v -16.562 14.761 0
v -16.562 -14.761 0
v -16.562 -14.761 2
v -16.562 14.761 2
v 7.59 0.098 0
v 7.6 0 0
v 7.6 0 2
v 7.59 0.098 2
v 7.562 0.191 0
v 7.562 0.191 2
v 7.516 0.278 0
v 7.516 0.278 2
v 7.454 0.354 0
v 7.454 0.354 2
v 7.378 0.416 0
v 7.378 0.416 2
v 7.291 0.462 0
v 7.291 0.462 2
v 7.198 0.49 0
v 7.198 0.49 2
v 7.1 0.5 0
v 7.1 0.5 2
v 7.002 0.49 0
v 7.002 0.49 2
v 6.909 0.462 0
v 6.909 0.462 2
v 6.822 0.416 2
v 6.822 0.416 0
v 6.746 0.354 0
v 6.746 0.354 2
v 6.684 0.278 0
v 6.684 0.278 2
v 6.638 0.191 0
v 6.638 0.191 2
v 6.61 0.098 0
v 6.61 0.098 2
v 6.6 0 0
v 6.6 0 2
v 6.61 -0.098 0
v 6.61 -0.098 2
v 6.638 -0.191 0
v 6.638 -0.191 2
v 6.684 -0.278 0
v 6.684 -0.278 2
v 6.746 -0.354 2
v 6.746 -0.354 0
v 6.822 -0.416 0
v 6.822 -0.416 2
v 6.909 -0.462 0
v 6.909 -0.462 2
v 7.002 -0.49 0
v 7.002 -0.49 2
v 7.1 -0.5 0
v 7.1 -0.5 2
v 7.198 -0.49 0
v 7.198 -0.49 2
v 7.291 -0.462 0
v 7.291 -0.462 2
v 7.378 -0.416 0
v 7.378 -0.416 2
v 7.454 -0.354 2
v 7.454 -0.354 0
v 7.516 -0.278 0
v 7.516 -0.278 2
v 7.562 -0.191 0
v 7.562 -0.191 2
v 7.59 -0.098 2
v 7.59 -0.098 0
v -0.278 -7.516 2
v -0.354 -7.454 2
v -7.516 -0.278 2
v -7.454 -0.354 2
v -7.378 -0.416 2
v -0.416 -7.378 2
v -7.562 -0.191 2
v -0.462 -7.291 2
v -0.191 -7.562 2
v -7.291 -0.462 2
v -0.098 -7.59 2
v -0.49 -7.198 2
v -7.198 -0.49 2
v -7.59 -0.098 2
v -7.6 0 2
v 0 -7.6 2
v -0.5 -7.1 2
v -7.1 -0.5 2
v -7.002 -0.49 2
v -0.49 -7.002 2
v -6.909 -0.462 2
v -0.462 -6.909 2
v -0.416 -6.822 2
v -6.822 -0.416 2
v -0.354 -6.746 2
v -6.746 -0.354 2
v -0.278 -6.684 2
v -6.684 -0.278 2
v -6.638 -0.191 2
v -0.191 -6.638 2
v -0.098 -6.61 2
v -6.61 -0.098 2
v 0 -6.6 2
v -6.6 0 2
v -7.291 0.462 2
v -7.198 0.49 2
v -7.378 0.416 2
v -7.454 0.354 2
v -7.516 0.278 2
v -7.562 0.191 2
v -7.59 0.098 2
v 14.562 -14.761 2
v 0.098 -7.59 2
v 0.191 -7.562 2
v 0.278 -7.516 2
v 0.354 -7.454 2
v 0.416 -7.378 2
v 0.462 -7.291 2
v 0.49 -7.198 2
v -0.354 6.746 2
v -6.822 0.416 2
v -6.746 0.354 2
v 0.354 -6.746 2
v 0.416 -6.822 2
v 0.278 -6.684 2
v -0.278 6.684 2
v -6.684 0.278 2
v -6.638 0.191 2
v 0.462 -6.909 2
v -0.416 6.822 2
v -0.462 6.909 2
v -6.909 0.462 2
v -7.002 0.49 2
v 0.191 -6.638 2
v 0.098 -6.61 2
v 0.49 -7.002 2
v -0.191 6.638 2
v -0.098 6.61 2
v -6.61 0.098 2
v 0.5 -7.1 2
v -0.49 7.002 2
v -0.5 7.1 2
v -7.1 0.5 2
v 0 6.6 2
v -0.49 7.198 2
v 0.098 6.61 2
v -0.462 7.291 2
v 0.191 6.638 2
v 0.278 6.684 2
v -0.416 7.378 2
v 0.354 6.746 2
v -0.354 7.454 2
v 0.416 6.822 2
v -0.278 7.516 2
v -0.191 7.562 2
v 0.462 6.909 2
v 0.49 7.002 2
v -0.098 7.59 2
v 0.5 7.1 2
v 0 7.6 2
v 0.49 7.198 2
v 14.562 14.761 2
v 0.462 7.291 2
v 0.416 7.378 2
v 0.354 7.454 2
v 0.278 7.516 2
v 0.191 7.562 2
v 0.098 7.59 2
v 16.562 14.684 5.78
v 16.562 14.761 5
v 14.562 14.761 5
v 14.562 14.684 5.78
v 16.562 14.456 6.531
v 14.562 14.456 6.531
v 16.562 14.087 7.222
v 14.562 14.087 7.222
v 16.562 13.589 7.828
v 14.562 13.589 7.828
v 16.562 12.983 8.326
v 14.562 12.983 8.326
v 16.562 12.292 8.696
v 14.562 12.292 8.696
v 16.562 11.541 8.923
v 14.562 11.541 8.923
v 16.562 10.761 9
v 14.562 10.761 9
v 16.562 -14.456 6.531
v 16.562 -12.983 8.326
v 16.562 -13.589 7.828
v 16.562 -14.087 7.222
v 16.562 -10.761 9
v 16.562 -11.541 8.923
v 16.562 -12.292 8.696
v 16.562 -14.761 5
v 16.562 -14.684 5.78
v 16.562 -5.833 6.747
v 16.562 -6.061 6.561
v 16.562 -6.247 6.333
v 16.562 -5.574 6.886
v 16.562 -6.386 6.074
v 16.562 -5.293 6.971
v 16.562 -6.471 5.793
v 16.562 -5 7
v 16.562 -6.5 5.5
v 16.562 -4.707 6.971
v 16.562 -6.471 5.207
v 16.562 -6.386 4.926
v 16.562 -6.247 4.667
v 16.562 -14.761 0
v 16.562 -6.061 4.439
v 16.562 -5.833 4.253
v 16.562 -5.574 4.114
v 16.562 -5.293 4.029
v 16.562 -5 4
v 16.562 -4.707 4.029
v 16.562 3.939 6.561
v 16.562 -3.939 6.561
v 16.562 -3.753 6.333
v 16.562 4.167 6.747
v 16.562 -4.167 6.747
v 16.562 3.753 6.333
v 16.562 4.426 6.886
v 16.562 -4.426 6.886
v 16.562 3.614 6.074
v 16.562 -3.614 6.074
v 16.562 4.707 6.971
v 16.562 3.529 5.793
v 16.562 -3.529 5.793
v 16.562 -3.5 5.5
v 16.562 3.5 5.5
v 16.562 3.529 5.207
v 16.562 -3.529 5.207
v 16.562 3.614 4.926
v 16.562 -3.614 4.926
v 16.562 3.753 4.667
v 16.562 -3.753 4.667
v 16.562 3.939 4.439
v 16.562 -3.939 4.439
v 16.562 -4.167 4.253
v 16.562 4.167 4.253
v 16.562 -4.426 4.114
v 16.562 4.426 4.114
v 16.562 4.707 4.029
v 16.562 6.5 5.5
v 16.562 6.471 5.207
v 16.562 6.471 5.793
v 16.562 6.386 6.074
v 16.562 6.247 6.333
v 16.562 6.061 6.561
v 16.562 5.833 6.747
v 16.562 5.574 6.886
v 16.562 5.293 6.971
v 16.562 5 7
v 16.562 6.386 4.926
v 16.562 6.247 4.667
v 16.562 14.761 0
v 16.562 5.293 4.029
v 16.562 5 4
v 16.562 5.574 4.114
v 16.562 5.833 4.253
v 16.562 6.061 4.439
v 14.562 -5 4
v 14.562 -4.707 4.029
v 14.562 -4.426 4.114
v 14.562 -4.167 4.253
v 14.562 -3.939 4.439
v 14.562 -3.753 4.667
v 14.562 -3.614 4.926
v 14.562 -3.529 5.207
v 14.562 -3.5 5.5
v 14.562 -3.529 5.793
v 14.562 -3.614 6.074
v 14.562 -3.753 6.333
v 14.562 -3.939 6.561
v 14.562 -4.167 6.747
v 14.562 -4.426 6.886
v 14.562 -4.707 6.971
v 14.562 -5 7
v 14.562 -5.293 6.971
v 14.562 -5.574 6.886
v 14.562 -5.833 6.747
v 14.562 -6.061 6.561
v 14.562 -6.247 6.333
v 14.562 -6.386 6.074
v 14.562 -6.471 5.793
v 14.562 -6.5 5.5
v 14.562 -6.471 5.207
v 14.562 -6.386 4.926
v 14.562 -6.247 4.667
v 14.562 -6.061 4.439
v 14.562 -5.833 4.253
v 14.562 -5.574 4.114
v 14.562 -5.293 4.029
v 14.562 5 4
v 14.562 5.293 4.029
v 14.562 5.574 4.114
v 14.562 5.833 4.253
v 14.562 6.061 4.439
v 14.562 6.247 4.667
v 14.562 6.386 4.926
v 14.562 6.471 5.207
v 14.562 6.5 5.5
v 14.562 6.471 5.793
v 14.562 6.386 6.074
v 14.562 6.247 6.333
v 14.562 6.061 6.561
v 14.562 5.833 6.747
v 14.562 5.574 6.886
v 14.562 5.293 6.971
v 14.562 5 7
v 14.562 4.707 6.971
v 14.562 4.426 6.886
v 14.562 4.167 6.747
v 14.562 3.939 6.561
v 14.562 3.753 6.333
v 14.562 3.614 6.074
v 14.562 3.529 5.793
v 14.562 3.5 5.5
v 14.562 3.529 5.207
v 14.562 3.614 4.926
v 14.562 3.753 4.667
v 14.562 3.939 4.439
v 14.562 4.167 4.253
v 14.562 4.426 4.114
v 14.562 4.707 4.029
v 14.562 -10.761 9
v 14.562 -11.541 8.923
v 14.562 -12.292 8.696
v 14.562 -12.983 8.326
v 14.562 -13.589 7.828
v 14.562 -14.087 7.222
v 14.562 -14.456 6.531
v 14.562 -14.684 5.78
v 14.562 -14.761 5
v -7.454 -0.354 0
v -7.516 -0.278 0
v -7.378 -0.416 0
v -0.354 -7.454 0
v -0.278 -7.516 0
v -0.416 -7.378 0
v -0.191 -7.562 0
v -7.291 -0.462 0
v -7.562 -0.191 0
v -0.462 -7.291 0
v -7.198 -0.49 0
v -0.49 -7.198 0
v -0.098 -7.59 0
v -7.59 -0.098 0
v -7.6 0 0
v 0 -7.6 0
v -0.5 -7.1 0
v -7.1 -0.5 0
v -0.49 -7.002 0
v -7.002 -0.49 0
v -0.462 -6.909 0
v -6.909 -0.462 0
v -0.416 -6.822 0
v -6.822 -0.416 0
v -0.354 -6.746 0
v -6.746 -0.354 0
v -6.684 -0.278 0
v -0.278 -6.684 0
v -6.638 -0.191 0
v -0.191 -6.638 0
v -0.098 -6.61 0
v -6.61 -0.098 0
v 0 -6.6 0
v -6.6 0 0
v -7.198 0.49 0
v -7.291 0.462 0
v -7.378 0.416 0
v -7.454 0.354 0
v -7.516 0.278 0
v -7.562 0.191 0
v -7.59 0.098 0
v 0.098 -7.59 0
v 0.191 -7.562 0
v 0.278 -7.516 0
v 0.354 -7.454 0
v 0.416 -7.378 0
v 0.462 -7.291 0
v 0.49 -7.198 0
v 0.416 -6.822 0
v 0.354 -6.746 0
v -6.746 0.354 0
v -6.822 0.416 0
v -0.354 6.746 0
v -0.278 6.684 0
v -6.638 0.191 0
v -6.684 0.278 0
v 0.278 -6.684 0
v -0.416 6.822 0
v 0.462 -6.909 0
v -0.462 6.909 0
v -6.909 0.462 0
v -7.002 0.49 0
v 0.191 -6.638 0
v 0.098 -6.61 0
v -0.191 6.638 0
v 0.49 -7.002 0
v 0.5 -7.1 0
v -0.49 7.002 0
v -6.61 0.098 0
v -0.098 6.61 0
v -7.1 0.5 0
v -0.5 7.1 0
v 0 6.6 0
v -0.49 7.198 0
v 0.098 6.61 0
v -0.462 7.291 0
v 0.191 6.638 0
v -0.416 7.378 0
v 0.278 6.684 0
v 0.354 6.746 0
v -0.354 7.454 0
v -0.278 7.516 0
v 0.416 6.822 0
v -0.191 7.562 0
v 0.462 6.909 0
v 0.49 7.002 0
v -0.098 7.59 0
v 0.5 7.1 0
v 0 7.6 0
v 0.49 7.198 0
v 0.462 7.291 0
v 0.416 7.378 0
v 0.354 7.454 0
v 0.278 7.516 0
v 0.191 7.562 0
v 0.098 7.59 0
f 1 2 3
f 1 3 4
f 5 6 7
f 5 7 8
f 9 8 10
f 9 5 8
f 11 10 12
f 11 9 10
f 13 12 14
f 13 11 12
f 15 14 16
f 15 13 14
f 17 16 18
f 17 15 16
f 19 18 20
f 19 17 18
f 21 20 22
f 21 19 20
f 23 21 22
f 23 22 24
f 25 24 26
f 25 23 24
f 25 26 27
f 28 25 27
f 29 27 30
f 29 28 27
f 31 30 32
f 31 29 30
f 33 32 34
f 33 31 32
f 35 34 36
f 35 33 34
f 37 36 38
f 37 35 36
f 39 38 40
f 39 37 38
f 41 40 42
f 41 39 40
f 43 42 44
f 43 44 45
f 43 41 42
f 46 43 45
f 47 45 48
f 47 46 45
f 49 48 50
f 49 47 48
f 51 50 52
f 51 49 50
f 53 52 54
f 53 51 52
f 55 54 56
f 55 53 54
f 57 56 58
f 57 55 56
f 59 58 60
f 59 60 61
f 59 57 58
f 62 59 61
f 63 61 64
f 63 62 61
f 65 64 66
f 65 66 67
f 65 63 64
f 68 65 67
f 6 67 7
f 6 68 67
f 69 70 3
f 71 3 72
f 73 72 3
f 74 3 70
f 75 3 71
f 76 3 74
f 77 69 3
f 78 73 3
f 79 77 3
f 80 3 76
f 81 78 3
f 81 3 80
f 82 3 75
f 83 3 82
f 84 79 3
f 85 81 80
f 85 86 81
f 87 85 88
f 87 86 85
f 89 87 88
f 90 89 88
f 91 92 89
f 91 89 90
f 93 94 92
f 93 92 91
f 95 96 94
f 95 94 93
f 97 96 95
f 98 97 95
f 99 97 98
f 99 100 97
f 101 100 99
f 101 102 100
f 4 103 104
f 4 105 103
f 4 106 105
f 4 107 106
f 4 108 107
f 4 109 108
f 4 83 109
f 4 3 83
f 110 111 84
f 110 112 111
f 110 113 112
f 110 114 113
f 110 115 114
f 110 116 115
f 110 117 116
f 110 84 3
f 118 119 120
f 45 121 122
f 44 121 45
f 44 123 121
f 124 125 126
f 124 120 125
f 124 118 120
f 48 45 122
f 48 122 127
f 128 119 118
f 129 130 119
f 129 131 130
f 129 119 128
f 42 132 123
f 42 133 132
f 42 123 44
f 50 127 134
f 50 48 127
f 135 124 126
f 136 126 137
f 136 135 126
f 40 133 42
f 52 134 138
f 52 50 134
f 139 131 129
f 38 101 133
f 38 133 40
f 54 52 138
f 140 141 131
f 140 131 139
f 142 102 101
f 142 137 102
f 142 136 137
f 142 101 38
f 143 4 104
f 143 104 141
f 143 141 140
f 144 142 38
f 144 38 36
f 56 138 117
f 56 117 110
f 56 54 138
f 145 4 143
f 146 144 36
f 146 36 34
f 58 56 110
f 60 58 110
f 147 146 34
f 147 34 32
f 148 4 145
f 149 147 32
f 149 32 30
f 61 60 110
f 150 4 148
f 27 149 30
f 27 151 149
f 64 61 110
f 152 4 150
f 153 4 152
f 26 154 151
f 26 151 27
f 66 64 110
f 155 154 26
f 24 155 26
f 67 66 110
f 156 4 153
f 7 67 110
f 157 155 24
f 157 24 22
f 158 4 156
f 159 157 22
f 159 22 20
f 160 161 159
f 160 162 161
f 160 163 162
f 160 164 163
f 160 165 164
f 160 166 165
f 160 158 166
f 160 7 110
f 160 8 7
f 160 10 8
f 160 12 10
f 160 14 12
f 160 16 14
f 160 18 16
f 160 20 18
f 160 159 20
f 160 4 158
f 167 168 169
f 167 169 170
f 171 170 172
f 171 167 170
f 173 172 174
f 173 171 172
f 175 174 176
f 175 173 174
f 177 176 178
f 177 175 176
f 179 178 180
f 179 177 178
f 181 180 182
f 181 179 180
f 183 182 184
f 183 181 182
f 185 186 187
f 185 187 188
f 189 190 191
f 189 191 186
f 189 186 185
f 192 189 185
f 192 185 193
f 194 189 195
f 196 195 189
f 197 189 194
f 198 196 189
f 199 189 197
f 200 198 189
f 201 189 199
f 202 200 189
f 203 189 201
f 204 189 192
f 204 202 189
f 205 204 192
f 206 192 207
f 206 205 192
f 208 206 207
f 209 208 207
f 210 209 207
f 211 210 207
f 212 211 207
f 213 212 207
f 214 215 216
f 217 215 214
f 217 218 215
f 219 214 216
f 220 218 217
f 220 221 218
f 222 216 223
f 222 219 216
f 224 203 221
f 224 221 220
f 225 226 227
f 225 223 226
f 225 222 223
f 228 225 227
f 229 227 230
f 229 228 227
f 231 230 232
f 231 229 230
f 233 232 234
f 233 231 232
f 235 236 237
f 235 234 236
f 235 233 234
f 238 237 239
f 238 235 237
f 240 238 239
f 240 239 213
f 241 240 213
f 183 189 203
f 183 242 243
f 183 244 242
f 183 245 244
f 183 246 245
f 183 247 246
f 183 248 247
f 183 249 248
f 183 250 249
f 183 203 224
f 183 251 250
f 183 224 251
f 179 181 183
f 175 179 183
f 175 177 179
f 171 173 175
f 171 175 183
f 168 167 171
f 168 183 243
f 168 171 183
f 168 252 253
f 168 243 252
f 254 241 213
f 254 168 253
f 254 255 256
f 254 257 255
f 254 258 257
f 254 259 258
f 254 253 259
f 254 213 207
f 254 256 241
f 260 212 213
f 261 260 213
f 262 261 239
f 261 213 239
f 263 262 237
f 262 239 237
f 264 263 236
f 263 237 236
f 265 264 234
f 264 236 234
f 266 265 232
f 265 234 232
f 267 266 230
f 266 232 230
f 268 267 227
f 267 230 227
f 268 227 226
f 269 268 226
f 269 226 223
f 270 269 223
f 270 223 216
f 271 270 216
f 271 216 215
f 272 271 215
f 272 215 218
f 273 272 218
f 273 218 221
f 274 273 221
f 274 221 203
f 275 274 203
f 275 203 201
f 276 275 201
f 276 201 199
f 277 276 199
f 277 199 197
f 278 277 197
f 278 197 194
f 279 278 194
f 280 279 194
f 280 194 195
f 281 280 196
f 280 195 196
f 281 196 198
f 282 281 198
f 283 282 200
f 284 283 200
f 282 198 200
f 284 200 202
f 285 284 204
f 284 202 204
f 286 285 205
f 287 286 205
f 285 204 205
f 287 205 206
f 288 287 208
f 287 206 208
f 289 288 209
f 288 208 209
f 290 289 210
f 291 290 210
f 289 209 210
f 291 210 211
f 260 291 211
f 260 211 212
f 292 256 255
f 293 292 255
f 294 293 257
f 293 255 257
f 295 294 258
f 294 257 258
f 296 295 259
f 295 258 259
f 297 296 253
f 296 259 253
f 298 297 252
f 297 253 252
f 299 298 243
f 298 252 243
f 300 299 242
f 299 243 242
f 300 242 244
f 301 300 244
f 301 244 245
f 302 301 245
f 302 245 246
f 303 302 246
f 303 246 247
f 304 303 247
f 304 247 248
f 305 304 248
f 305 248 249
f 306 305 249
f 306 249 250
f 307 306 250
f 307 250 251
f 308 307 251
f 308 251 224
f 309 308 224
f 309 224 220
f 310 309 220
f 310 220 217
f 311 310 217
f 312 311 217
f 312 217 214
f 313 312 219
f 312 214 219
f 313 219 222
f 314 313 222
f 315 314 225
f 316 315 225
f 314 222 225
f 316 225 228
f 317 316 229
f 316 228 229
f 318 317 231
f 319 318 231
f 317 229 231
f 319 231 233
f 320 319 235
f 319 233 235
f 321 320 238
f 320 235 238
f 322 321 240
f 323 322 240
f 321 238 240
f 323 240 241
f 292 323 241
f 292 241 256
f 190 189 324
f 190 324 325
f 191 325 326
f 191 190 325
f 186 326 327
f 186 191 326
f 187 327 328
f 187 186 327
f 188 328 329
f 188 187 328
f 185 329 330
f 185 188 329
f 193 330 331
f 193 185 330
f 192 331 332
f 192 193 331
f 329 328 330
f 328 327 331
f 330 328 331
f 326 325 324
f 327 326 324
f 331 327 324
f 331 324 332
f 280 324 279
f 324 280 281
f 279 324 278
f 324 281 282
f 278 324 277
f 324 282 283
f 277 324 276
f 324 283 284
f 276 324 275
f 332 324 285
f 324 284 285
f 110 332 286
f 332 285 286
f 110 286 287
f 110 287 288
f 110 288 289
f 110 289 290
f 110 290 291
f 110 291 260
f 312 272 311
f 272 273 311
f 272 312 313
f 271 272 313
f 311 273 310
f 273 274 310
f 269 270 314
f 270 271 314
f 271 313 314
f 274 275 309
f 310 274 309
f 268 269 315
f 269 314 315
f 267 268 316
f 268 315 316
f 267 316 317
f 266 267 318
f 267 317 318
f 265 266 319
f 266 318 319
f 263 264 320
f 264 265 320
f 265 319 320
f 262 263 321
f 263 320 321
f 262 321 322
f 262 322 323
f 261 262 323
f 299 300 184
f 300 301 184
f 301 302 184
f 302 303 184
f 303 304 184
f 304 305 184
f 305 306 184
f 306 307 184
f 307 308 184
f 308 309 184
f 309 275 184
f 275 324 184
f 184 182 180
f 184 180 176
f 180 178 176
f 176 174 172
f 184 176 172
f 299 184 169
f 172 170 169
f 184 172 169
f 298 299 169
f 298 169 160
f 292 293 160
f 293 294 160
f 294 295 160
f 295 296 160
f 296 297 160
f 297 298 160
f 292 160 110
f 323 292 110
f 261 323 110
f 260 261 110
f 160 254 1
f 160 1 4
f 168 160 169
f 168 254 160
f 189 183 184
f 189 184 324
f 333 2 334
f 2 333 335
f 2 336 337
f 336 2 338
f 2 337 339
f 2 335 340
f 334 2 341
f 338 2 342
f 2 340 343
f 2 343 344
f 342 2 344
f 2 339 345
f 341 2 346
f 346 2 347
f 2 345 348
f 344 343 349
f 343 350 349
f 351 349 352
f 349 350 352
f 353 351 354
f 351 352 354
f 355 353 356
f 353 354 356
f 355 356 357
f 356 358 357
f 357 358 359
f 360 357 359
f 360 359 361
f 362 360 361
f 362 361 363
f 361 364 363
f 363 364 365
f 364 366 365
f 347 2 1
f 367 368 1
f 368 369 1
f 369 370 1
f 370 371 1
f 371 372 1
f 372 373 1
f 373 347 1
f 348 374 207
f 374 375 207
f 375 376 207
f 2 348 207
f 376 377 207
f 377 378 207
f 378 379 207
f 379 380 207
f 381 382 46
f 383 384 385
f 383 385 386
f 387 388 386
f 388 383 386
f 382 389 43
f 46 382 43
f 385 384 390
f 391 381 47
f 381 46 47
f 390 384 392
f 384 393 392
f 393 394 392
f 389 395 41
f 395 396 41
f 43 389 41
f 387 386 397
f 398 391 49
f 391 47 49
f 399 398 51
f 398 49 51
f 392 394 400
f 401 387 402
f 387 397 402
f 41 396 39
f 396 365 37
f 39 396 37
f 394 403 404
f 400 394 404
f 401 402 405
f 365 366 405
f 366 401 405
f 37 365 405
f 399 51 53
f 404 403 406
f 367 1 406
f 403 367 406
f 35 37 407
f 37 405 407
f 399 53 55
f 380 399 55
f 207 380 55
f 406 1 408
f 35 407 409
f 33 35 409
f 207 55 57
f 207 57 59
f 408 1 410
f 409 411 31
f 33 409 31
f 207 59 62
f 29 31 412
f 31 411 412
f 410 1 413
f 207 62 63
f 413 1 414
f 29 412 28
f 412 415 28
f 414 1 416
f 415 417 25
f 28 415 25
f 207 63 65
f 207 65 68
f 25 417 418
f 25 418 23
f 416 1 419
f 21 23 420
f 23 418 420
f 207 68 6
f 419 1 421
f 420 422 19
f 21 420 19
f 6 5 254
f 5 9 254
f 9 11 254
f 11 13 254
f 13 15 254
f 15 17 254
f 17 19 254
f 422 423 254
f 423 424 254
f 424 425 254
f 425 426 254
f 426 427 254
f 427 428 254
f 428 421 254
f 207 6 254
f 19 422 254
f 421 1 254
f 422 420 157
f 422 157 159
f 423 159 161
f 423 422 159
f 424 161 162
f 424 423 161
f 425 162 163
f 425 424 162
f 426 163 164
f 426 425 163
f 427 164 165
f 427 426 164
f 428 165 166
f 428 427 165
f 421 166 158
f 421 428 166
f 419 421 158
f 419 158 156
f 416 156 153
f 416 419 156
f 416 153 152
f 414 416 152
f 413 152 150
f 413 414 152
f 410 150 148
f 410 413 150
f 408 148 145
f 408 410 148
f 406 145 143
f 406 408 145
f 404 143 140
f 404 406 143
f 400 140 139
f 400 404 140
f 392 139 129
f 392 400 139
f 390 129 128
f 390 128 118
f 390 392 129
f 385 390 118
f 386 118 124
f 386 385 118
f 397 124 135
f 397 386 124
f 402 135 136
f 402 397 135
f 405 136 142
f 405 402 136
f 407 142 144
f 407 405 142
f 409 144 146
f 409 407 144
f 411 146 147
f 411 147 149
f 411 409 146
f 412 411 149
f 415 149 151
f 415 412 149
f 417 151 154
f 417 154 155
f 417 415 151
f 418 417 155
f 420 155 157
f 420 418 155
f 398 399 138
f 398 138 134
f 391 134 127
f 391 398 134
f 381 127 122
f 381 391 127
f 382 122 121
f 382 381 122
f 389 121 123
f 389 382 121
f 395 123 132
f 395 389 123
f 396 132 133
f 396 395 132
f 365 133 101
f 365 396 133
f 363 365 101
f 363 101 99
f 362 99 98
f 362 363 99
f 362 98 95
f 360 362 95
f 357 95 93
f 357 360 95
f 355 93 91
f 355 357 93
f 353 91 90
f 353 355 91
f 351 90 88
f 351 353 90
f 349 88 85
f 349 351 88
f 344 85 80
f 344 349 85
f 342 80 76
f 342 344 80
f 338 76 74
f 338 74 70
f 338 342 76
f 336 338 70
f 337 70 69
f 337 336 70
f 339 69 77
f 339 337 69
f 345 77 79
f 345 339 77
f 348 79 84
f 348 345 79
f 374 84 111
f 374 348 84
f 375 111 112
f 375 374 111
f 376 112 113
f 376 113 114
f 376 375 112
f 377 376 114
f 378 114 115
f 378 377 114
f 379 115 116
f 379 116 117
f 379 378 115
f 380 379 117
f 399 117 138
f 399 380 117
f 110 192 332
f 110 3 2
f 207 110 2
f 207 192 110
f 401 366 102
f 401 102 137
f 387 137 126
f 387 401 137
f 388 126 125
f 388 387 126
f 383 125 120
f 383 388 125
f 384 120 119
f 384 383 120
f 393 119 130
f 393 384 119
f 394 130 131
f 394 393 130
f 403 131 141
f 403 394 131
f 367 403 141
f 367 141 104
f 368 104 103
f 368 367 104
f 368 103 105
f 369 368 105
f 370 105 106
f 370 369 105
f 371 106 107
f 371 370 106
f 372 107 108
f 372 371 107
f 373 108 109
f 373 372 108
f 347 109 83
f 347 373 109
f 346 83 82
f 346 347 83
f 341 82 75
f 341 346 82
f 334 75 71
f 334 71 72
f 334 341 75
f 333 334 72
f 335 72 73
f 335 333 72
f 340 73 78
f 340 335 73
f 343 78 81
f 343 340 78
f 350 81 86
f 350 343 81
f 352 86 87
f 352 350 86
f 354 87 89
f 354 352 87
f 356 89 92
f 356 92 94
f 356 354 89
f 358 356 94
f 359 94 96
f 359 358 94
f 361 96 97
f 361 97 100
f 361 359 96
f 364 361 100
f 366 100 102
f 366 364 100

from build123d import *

# Parameters (mm, degrees)
SKETCH_1_W          = 33.124171168
SKETCH_1_H          = 29.521848668
SKETCH_1_R          = 0.5
EXTRUDE_1_DEPTH     = 2
EXTRUDE_2_DEPTH     = 2
CUT_EXTRUDE_1_DEPTH = 6


with BuildPart() as part:
    # 草图1 → 凸台-拉伸1 (new body)
    with BuildSketch(Plane.XY):
        Rectangle(SKETCH_1_W, SKETCH_1_H)
        with Locations((0, 7.1)):
            Circle(SKETCH_1_R, mode=Mode.SUBTRACT)
        with Locations((7.1, 0)):
            Circle(SKETCH_1_R, mode=Mode.SUBTRACT)
        with Locations((0, -7.1)):
            Circle(SKETCH_1_R, mode=Mode.SUBTRACT)
        with Locations((-7.1, 0)):
            Circle(SKETCH_1_R, mode=Mode.SUBTRACT)
    extrude(amount=EXTRUDE_1_DEPTH)

    # 草图2 → 凸台-拉伸2 (add)
    with BuildSketch(Plane(origin=(16.562085584, 0, 0), x_dir=(0, 0, -1), z_dir=(1, 0, 0))):
        with BuildLine():
            Line((-5, -14.760924334), (0, -14.760924334))
            Line((0, -14.760924334), (0, 14.760924334))
            Line((0, 14.760924334), (-5, 14.760924334))
            ThreePointArc((-5, 14.760924334), (-7.828427125, 13.589351458), (-9, 10.760924334))
            Line((-9, 10.760924334), (-9, -10.760924334))
            ThreePointArc((-9, -10.760924334), (-7.828427125, -13.589351458), (-5, -14.760924334))
        make_face()
    extrude(amount=-EXTRUDE_2_DEPTH)

    # 草图3 → 切除-拉伸1 (cut)
    with BuildSketch(Plane(origin=(16.562085584, 0, 0), x_dir=(0, 0, -1), z_dir=(1, 0, 0))):
        with BuildLine():
            ThreePointArc((-7, -5), (-5.5, -6.5), (-4, -5))
            ThreePointArc((-4, -5), (-5.5, -3.5), (-7, -5))
        make_face()
        with BuildLine():
            ThreePointArc((-7, 5), (-5.5, 3.5), (-4, 5))
            ThreePointArc((-4, 5), (-5.5, 6.5), (-7, 5))
        make_face()
    extrude(amount=-CUT_EXTRUDE_1_DEPTH, mode=Mode.SUBTRACT)


solid = part.part
